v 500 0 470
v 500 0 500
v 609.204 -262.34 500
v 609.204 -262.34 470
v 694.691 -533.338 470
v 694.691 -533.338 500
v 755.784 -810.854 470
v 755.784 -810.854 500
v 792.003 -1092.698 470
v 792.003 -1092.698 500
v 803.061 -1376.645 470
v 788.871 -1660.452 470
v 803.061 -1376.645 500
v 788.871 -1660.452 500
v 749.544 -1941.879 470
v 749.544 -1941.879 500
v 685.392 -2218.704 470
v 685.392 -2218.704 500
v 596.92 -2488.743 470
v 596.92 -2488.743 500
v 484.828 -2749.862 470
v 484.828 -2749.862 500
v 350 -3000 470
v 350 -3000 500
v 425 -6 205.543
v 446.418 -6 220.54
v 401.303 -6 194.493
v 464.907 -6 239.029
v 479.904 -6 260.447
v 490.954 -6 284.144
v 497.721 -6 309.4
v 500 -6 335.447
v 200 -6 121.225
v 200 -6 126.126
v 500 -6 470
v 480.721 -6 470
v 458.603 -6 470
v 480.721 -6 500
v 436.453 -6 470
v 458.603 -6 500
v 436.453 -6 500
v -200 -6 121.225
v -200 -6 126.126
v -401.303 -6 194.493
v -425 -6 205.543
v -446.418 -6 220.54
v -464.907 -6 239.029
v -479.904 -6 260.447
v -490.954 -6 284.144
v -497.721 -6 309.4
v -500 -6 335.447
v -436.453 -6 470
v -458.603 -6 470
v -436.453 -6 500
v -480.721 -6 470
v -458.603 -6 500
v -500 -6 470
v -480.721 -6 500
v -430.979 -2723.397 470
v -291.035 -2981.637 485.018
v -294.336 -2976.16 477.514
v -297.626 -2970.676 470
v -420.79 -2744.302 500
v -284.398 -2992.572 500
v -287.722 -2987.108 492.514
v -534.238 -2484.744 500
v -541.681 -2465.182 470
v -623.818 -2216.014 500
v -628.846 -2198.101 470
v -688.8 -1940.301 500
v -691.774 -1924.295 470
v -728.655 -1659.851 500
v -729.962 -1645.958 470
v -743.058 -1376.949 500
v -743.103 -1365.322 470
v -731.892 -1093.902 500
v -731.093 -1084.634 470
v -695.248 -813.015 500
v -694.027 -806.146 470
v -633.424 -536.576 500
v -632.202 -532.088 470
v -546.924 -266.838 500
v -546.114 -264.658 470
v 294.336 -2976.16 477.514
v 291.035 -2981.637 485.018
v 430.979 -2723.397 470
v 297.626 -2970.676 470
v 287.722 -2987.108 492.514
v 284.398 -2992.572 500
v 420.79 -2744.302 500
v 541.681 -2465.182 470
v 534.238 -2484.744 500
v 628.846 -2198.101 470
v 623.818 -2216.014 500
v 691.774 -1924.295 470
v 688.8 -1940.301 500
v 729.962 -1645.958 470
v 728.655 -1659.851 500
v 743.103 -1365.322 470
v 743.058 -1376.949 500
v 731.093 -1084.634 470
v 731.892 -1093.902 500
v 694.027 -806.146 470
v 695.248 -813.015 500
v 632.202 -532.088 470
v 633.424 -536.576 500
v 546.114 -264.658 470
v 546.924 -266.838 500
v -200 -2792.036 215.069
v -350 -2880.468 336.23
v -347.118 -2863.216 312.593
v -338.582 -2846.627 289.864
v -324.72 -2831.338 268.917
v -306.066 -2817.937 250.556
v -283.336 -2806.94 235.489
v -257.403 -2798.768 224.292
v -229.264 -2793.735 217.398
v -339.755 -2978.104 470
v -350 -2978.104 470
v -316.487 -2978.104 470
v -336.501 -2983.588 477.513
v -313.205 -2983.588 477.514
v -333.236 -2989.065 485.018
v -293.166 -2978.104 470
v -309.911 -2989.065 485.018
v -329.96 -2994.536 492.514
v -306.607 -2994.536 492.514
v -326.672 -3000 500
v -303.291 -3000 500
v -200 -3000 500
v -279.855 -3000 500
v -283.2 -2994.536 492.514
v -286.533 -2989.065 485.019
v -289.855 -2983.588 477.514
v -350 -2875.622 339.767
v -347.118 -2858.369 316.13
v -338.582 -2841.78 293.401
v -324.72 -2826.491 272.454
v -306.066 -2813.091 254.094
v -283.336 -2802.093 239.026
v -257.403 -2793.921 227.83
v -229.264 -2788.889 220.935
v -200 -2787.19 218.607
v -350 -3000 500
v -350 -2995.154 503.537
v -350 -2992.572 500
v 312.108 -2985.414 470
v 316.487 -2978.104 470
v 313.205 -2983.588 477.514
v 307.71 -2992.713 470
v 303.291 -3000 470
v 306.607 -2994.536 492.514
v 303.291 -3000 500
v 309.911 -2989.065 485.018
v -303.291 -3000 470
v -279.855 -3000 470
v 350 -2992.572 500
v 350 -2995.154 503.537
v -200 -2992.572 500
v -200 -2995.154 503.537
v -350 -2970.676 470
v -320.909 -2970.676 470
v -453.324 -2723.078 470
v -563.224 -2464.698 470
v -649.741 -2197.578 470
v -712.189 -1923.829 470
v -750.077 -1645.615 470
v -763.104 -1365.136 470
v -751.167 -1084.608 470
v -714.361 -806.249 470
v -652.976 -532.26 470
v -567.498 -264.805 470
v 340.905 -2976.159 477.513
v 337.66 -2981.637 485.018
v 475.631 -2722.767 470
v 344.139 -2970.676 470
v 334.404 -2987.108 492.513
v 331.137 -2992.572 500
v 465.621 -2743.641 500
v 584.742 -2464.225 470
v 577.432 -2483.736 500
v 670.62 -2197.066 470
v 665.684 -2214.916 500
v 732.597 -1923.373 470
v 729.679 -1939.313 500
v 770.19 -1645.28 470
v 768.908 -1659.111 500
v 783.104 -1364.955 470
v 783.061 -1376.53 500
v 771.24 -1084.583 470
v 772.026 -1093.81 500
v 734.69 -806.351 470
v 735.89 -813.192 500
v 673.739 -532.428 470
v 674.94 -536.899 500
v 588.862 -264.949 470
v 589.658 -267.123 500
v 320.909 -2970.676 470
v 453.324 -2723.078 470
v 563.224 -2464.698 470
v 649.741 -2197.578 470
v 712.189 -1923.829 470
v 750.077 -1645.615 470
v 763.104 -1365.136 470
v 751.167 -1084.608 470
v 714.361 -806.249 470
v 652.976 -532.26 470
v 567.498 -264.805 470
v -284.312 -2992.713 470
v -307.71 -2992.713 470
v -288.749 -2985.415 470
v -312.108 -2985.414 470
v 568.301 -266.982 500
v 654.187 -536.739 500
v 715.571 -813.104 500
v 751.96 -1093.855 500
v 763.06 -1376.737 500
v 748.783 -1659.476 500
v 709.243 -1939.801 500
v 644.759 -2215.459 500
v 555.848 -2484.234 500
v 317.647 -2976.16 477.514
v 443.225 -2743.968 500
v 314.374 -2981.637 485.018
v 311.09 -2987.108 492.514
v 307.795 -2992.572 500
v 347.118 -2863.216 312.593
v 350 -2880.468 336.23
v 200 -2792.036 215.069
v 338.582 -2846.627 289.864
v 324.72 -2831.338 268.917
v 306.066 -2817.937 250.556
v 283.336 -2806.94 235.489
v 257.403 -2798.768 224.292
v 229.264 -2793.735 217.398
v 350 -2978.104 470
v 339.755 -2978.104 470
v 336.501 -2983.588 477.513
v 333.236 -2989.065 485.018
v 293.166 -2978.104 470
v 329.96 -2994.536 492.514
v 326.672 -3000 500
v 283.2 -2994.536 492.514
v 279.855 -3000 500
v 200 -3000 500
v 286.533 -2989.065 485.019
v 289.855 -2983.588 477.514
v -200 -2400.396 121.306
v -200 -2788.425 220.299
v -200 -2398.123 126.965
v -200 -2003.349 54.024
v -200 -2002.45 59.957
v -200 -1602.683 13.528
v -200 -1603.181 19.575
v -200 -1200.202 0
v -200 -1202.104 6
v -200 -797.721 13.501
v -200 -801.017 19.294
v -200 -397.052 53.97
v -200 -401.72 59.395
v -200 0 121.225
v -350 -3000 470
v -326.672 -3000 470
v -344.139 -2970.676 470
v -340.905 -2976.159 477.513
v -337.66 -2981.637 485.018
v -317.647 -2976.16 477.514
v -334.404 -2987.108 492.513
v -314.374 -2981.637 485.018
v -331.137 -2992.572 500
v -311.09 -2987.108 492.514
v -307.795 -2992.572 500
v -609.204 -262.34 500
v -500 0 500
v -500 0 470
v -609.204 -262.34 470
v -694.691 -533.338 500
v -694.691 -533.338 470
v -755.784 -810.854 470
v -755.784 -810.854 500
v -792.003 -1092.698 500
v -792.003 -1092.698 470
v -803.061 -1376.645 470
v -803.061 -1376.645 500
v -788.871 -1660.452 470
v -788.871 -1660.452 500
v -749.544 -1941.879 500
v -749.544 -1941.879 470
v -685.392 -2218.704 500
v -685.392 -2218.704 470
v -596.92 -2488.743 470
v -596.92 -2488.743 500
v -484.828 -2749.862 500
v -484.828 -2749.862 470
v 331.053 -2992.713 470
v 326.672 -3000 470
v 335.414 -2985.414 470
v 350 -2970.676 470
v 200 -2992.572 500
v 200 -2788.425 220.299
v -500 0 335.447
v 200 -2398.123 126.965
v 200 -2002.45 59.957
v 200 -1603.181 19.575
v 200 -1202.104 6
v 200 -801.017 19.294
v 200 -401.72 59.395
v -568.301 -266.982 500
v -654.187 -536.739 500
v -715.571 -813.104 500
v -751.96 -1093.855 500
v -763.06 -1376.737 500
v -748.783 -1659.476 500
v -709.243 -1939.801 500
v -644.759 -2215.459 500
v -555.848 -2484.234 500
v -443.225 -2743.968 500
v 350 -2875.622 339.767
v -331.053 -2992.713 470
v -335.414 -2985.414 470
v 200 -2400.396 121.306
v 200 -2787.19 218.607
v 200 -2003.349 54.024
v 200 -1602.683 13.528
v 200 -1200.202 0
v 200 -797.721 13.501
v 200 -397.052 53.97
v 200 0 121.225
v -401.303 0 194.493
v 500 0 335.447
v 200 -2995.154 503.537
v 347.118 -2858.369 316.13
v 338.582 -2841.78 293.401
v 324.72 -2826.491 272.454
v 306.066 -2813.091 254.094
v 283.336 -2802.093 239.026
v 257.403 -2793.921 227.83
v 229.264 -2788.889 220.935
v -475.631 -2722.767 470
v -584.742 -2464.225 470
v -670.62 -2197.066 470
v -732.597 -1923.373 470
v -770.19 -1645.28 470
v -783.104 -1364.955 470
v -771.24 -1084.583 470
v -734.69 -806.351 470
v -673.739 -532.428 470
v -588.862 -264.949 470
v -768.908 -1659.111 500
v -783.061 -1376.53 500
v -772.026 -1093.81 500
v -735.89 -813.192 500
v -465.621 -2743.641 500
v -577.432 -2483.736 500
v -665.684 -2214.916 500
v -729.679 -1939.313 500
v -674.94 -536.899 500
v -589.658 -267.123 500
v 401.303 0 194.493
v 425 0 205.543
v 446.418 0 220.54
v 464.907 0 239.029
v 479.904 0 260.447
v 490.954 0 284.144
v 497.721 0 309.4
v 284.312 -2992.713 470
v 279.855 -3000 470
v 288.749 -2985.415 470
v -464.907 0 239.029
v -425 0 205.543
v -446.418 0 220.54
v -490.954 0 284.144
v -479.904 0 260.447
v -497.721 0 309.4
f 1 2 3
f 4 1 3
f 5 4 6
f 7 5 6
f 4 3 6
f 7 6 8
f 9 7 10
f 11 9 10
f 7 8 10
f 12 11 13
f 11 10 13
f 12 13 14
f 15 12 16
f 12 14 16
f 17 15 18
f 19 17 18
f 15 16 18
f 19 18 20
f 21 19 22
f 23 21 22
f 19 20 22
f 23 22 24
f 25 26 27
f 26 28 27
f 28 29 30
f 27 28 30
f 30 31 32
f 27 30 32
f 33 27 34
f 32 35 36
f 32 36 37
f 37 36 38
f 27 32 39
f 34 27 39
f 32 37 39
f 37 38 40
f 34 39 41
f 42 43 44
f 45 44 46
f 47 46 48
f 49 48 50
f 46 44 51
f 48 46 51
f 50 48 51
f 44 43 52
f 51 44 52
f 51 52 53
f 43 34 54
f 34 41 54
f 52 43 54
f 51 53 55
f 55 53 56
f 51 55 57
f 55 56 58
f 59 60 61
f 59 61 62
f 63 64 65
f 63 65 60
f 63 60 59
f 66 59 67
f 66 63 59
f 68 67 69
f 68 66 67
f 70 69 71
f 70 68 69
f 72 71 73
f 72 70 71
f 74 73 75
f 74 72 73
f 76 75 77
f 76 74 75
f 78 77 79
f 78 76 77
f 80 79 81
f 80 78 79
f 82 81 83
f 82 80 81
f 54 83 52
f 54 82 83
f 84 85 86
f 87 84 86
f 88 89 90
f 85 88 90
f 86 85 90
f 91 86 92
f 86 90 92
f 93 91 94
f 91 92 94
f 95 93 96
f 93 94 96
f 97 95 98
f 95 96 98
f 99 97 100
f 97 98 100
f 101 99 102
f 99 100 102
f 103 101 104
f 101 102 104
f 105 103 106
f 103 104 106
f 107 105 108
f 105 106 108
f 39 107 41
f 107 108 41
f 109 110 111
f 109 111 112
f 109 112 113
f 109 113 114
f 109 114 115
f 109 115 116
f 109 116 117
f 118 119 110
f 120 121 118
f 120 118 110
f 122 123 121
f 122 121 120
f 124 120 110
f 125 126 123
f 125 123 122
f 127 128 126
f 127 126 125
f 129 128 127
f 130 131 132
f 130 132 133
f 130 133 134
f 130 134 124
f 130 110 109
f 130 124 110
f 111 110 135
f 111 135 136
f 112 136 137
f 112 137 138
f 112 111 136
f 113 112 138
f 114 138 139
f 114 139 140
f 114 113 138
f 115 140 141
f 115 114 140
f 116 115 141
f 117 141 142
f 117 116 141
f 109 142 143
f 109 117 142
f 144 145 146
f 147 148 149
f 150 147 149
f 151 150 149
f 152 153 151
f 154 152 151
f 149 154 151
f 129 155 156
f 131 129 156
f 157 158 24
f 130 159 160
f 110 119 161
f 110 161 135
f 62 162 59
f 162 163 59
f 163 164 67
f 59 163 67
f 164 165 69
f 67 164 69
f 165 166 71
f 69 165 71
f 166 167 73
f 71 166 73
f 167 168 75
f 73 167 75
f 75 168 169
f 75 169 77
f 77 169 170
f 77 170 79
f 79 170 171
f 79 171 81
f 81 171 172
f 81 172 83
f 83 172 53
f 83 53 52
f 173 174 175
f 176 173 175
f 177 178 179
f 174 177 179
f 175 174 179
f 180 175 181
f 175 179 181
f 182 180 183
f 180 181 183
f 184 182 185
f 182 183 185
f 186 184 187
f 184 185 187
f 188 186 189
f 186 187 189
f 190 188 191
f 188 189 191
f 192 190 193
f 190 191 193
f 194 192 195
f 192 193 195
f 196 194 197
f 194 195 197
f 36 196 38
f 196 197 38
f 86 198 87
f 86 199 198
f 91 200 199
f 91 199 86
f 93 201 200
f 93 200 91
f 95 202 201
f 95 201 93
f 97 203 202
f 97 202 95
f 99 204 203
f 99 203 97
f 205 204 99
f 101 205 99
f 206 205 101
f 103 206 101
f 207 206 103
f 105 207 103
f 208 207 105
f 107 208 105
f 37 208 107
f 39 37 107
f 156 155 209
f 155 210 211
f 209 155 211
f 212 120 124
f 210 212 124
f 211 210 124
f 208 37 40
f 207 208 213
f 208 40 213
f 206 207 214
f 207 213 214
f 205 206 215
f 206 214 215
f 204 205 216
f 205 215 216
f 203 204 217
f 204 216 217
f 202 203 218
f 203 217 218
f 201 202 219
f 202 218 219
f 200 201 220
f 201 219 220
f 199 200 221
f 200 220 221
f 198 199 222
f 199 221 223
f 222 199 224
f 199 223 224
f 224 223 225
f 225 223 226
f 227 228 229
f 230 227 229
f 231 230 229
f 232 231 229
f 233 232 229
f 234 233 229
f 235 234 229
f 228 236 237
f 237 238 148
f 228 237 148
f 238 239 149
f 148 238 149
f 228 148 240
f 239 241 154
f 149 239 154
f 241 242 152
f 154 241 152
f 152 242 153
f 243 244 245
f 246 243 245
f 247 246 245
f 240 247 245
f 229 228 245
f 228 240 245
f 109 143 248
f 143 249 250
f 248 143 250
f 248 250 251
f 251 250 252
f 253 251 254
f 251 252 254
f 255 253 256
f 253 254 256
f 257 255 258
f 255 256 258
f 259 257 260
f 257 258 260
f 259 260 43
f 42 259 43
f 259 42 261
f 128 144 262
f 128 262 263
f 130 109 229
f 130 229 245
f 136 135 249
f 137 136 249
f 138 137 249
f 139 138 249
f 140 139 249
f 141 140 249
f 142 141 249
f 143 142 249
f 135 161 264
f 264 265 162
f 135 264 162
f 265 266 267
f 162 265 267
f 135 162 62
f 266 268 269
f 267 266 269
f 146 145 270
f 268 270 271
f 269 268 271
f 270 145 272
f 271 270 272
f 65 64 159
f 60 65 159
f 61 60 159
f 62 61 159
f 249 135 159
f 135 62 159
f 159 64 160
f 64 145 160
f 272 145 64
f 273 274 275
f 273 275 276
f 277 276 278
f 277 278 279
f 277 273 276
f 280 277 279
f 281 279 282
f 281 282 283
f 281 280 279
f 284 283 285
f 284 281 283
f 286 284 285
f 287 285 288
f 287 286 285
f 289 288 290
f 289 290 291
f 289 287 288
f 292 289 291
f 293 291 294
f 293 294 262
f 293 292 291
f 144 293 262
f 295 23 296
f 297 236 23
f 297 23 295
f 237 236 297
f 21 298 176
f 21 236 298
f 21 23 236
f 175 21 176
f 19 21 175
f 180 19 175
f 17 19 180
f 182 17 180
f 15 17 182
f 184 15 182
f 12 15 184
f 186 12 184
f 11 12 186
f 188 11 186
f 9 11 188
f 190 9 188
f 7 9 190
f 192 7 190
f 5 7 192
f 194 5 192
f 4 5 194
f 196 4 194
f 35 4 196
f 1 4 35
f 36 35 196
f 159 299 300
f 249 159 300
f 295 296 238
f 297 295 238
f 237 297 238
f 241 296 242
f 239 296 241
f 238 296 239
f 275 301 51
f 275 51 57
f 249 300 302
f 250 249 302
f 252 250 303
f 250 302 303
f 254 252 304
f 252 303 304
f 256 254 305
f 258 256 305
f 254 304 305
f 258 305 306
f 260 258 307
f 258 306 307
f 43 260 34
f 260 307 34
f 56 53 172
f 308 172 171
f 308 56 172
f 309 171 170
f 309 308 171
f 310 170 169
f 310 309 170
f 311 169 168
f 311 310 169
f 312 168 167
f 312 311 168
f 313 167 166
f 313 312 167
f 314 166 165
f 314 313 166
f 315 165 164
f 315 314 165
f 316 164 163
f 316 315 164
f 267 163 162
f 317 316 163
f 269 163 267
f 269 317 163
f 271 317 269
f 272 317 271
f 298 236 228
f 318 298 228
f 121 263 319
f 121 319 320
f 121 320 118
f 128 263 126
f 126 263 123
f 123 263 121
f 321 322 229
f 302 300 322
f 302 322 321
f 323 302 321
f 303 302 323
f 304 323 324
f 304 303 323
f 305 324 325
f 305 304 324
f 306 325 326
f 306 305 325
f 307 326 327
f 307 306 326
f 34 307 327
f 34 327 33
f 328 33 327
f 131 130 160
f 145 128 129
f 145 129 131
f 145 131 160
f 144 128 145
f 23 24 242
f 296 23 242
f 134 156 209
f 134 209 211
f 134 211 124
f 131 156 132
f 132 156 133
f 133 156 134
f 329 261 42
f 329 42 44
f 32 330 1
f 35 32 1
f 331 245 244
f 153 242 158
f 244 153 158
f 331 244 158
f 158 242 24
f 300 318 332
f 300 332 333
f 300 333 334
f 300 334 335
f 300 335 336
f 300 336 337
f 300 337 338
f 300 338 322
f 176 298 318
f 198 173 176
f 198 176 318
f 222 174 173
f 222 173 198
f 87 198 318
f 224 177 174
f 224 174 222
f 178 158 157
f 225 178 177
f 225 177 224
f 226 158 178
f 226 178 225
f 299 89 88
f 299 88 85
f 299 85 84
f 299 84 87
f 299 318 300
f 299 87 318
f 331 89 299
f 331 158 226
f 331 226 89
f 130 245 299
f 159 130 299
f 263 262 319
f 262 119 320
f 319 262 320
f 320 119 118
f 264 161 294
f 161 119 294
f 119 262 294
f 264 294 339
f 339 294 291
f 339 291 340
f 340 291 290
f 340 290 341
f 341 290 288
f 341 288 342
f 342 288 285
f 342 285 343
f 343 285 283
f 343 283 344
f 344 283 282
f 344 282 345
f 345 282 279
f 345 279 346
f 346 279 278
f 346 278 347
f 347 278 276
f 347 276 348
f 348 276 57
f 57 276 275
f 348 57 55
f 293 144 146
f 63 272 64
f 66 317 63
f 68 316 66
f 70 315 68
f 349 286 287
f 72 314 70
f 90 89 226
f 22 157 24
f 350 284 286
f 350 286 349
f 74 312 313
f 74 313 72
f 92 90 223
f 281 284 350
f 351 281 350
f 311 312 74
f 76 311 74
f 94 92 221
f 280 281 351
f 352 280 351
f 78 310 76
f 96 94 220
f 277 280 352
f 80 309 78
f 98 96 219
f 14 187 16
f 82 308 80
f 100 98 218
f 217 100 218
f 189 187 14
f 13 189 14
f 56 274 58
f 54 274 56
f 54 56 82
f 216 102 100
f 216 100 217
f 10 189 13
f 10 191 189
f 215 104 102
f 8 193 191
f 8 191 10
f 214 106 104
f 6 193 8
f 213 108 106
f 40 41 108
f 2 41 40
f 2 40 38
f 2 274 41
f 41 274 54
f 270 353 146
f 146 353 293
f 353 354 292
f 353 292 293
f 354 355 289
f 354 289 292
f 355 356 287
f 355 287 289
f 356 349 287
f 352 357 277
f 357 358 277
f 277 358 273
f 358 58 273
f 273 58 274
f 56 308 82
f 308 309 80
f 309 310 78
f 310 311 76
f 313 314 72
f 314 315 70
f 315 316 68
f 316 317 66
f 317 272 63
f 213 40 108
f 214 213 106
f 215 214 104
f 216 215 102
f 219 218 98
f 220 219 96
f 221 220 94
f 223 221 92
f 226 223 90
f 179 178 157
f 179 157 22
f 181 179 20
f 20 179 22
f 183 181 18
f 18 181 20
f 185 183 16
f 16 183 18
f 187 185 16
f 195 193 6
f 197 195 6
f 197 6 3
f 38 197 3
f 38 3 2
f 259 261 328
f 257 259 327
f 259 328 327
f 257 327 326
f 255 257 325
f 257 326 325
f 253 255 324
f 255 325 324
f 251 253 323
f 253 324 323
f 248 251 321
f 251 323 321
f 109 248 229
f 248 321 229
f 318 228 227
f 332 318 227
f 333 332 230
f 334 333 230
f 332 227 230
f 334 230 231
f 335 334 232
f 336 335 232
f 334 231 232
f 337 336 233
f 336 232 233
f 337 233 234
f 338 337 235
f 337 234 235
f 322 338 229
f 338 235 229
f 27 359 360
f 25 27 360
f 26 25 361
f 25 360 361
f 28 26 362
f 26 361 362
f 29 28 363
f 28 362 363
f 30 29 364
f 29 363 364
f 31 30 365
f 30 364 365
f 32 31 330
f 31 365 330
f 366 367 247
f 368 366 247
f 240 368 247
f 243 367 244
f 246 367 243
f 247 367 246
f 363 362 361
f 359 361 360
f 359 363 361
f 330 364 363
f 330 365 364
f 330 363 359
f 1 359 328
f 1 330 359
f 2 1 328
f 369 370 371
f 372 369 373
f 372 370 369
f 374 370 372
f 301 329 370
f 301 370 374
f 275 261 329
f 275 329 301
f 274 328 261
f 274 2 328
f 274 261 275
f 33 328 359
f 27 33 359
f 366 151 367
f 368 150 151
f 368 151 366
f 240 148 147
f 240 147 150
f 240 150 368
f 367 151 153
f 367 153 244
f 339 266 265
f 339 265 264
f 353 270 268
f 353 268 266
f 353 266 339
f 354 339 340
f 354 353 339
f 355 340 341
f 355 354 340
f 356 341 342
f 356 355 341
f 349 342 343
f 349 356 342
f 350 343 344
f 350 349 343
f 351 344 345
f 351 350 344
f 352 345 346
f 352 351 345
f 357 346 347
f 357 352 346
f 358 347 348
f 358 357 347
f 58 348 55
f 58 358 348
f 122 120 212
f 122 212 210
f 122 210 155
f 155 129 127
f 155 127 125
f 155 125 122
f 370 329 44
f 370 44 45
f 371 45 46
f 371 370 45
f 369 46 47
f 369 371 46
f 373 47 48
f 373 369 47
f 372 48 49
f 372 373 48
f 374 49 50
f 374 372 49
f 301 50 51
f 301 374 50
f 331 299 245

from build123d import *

# Parameters (mm, degrees)
F0_W           = 3000
F0_H           = 500
F1_DEPTH       = 200
F1_DEPTH_BACK  = 200
F3_DEPTH       = 400.001
F5_DEPTH       = 400.001
F26_DEPTH      = 6
F29_DEPTH      = 30
F32_DEPTH      = 6
F35_DEPTH      = 25
F35_DEPTH_BACK = 10


with BuildPart() as f1:
    # F0 (on Right) → F1 (new body, two sides)
    with BuildSketch(Plane.YZ) as f1_sk:
        with Locations((-1500, 250)):
            Rectangle(F0_W, F0_H)
    extrude(amount=F1_DEPTH)
    extrude(f1_sk.sketch, amount=-F1_DEPTH_BACK)

    # F2 (on face) → F3 (cut, through all)
    with BuildSketch(Plane.YZ.offset(200)):
        with BuildLine():
            Line((-3000, 0), (-1199.9999999986, 0))
            ThreePointArc((-1199.9999999986, 0), (-2003.2486734251, 54.0104634602), (-2792.036069143, 215.0694771201))
            Line((-2792.036069143, 215.0694771201), (-3000, 500))
            Line((-3000, 500), (-3000, 0))
        make_face()
        with BuildLine():
            Line((-1199.9999999986, 0), (0, 0))
            Line((0, 0), (0, 121.2246173204))
            ThreePointArc((0, 121.2246173204), (-596.9462279681, 30.3830819693), (-1199.9999999986, 0))
        make_face()
    extrude(amount=-F3_DEPTH, mode=Mode.SUBTRACT)

    # F4 (on face) → F5 (cut, through all)
    with BuildSketch(Plane.YZ.offset(200)):
        with BuildLine():
            Line((-2992.5718185587, 500), (-2788.4248667868, 220.2991044022))
            ThreePointArc((-2788.4248667868, 220.2991044022), (-1402.7557748773, 9.4302361333), (-6, 126.1256397502))
            Line((-6, 126.1256397502), (-6, 500))
            Line((-6, 500), (-2992.5718185587, 500))
        make_face()
    extrude(amount=-F5_DEPTH, mode=Mode.SUBTRACT)

    # F25 (on face) → F26 (join)
    with BuildSketch(Plane(origin=(0, -1719.2076616053, -1254.8082938014), x_dir=(1, 0, 0), z_dir=(0, -0.8077347124, -0.5895461258))):
        with BuildLine():
            ThreePointArc((-350, 1969.7531298143), (-306.066017178, 1863.6871126364), (-200, 1819.7531298143))
            Line((-200, 1819.7531298143), (-200, 2172.5057334987))
            Line((-200, 2172.5057334987), (-350, 2172.5057334987))
            Line((-350, 2172.5057334987), (-350, 1969.7531298143))
        make_face()
    extrude(amount=-F26_DEPTH)

    # F27: F1 across plane


with BuildPart() as f1_1:
    add(f1.part)
    add(f1.part.mirror(Plane.YZ))

    # F28 (on offset) → F29 (join)
    with BuildSketch(Plane.XY.offset(500)):
        with BuildLine():
            ThreePointArc((-279.8554782444, -3000), (-738.9981172291, -1519.5883890542), (-433.5777043409, 0))
            Line((-433.5777043409, 0), (-455.7501152614, 0))
            ThreePointArc((-455.7501152614, 0), (-759.0395211586, -1519.2869883443), (-303.291351886, -3000))
            Line((-303.291351886, -3000), (-279.8554782444, -3000))
        make_face()
        with BuildLine():
            Line((-477.8906365943, 0), (-500, 0))
            ThreePointArc((-500, 0), (-799.1195970095, -1518.7059798505), (-350, -3000))
            Line((-350, -3000), (-326.6723920839, -3000))
            ThreePointArc((-326.6723920839, -3000), (-647.2242800034, -2278.3764408495), (-779.9804109366, -1500))
            ThreePointArc((-779.9804109366, -1500), (-720.5554965192, -731.5483620704), (-477.8906365943, 0))
        make_face()
    extrude(amount=-F29_DEPTH)

    # F30: F1 across plane


with BuildPart() as f1_2:
    add(f1_1.part)
    add(f1_1.part.mirror(Plane.YZ))

    # F31 (on Front) → F32 (join)
    with BuildSketch(Plane.XZ):
        with BuildLine():
            Line((200, 500), (200, 121.2246173204))
            Line((200, 121.2246173204), (401.3030214989, 194.4929252138))
            ThreePointArc((401.3030214989, 194.4929252138), (472.8728066433, 249.410352879), (500, 335.4468183317))
            Line((500, 335.4468183317), (500, 470))
            Line((500, 470), (500, 500))
            Line((500, 500), (200, 500))
        make_face()
    extrude(amount=F32_DEPTH)

    # F33: F1 across plane


with BuildPart() as f1_3:
    add(f1_2.part)
    add(f1_2.part.mirror(Plane.YZ))


with BuildPart() as f35:
    # F34 (on offset) → F35 (new body, two sides)
    with BuildSketch(Plane.XZ.offset(2000)) as f35_sk:
        with BuildLine():
            Line((-200, 6), (-100, 6))
            Line((-100, 6), (-100, 26))
            Line((-100, 26), (-200, 26))
            ThreePointArc((-200, 26), (-222.5742630967, 27.9749921084), (-244.4626186323, 33.8399592978))
            Line((-244.4626186323, 33.8399592978), (-697.5723728465, 198.7584226875))
            ThreePointArc((-697.5723728465, 198.7584226875), (-759.5995199718, 246.353526664), (-783.1097542142, 320.9184633896))
            Line((-783.1097542142, 320.9184633896), (-783.1097542142, 500))
            Line((-783.1097542142, 500), (-803.1097542142, 500))
            Line((-803.1097542142, 500), (-803.1097542142, 470))
            Line((-803.1097542142, 470), (-803.1097542142, 320.9184633896))
            ThreePointArc((-803.1097542142, 320.9184633896), (-775.9825608575, 234.881997937), (-704.412775713, 179.9645702718))
            Line((-704.412775713, 179.9645702718), (-251.3030214989, 15.0461068821))
            ThreePointArc((-251.3030214989, 15.0461068821), (-226.04722665, 8.2788370482), (-200, 6))
        make_face()
    extrude(amount=F35_DEPTH)
    extrude(f35_sk.sketch, amount=-F35_DEPTH_BACK)


solid = f1_3.part
